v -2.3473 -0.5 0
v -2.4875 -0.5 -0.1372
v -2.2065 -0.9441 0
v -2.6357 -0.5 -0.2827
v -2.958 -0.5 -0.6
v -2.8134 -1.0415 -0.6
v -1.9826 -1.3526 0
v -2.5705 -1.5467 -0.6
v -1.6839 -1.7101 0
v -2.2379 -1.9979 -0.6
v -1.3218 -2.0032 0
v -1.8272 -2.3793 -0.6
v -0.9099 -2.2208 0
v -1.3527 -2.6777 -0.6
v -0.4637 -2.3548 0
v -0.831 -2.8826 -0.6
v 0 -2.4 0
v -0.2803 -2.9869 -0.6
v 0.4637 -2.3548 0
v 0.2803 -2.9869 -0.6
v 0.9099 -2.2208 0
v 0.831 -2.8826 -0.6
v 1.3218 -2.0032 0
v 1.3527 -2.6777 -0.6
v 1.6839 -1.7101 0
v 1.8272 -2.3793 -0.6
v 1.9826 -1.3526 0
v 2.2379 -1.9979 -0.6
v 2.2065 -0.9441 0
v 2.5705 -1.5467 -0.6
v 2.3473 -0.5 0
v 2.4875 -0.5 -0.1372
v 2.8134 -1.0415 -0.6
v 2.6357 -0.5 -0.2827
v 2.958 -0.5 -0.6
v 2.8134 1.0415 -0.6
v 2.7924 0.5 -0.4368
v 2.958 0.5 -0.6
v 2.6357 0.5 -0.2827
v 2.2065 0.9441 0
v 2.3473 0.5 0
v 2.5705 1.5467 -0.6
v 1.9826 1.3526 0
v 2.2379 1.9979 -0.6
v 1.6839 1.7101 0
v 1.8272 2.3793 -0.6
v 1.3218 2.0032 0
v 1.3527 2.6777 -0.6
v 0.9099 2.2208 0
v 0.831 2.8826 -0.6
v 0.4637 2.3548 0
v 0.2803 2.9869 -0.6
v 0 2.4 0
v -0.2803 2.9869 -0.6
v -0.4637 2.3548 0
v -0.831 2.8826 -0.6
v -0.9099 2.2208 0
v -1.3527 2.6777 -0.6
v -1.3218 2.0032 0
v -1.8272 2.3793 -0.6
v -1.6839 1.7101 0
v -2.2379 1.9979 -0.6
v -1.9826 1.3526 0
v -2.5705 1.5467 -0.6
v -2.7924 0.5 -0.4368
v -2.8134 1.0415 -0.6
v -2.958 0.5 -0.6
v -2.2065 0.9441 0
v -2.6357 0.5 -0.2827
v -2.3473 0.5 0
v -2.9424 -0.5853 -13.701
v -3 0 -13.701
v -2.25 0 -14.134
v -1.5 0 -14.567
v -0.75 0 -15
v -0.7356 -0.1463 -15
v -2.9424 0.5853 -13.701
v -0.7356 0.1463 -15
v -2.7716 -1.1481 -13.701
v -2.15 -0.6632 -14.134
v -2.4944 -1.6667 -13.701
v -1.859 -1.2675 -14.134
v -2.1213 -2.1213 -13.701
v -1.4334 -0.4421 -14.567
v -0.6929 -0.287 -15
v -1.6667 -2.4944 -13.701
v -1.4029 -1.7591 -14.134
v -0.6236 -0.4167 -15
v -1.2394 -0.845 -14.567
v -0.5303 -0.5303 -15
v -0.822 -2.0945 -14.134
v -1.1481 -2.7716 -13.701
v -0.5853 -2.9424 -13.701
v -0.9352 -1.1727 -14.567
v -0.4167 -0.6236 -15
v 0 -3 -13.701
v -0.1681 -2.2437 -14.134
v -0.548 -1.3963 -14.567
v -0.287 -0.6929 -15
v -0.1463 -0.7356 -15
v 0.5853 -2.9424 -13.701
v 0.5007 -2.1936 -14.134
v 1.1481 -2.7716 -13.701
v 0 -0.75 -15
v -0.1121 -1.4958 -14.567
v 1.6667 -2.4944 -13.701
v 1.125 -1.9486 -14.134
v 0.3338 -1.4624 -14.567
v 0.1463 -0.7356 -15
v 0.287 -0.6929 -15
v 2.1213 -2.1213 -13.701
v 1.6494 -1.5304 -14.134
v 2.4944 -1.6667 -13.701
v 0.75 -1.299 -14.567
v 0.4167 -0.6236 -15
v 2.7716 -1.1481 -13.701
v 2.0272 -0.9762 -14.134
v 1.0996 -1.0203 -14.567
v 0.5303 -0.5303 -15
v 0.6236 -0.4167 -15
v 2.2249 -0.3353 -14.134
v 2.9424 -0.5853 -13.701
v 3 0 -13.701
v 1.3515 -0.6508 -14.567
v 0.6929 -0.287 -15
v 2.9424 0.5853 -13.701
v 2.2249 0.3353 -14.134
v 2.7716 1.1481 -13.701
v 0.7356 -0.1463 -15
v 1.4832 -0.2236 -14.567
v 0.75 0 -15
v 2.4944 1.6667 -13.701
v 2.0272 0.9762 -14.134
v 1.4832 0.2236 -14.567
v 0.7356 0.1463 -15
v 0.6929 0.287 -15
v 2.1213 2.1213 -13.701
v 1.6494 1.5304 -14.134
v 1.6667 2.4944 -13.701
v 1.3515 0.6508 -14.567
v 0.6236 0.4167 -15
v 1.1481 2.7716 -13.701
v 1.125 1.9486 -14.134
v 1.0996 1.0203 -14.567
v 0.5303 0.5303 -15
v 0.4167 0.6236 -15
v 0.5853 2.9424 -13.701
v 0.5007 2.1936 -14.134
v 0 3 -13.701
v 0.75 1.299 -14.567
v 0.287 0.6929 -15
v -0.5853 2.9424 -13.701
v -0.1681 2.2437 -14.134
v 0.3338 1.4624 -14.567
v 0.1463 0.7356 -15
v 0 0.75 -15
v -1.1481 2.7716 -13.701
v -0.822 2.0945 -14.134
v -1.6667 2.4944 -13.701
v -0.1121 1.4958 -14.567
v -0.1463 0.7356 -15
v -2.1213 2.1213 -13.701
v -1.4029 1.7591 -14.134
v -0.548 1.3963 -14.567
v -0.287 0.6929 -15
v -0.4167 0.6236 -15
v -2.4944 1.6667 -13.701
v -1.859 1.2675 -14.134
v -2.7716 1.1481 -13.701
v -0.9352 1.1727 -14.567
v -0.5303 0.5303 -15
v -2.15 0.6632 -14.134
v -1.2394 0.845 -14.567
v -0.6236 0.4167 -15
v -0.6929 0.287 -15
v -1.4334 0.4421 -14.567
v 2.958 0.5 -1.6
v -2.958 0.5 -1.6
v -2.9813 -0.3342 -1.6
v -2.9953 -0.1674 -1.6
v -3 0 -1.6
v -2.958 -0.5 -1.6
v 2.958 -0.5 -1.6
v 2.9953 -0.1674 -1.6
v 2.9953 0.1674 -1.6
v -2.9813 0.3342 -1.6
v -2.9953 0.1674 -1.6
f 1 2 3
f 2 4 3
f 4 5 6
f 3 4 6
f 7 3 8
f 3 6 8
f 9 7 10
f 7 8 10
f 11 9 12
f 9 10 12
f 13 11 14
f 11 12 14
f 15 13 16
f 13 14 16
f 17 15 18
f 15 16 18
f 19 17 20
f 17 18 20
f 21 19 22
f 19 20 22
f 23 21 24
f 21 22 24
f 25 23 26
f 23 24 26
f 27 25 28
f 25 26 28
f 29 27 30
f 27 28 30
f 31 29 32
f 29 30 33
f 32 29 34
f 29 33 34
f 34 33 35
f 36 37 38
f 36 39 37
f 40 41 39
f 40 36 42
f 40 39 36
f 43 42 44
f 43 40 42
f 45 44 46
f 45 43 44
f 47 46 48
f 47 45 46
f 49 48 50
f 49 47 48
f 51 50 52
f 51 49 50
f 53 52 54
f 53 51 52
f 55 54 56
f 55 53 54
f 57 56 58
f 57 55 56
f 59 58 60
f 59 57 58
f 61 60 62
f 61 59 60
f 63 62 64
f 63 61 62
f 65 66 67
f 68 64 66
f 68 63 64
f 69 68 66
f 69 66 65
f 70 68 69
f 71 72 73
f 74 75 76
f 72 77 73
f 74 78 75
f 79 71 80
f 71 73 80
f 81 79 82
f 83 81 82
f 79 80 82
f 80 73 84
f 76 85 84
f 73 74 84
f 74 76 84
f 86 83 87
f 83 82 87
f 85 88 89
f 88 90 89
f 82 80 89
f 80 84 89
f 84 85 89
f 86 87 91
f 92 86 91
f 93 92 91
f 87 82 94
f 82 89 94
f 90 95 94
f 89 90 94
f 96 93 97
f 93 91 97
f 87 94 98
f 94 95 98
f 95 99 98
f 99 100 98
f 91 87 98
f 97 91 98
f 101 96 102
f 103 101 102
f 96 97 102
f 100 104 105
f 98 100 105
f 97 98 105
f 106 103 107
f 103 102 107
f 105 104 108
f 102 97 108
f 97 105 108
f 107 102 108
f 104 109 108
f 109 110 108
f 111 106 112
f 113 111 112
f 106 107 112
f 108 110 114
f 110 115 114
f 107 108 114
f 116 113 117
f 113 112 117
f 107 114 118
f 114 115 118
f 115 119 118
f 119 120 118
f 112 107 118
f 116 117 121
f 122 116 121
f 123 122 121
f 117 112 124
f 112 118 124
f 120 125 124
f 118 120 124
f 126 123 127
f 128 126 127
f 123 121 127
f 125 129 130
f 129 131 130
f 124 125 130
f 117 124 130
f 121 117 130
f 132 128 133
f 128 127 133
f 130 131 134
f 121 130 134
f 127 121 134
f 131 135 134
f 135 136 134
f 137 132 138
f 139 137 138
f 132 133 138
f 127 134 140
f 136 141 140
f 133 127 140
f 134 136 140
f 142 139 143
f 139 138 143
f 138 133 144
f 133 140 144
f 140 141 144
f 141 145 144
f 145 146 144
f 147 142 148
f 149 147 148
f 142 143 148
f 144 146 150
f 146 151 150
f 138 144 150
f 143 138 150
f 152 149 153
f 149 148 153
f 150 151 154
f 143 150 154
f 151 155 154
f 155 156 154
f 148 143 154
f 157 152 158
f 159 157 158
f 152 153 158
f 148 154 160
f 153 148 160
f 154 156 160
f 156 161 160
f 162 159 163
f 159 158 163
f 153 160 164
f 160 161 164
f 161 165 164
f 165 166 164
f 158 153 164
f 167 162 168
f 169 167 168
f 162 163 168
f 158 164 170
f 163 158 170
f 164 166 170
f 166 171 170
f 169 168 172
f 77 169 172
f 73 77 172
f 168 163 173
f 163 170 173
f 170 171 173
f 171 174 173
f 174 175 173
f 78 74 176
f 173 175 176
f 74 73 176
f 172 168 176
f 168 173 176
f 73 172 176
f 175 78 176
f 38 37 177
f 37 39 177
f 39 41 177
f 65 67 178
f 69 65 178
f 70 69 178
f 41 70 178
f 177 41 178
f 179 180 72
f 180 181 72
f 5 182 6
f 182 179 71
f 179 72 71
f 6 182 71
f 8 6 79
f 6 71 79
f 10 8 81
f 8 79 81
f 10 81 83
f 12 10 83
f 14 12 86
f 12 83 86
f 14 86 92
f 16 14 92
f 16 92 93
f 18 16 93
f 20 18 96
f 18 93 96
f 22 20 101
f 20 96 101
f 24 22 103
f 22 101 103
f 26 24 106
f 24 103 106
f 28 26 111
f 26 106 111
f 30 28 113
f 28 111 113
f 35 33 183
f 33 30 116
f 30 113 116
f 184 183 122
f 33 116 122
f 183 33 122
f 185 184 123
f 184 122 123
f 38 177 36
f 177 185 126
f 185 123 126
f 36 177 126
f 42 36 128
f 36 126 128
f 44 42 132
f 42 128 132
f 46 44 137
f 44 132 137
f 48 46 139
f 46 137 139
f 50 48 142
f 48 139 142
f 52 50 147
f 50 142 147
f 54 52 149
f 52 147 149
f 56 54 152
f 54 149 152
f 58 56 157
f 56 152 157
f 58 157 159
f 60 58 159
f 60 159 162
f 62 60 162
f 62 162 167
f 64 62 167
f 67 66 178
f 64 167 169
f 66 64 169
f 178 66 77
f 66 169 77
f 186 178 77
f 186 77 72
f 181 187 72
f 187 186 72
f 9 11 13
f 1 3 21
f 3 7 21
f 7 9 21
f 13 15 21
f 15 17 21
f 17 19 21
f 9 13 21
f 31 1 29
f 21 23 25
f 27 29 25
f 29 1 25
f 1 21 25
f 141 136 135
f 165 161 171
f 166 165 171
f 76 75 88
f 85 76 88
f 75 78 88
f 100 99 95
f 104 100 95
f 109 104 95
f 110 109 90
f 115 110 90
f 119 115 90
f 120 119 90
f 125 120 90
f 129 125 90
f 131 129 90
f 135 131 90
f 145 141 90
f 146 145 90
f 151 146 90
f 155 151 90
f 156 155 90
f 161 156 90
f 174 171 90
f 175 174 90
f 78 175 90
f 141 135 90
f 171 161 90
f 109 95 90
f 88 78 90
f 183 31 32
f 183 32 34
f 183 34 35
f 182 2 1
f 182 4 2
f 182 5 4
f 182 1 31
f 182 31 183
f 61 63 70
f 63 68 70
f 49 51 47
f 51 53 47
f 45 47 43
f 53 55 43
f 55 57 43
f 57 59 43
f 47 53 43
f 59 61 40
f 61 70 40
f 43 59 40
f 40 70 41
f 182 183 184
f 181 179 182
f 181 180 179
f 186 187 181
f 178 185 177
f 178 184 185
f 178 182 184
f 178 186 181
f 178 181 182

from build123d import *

# Parameters (mm, degrees)
CUT_EXTRUDE_1_DEPTH      = 16.588457268
CUT_EXTRUDE_1_DEPTH_BACK = 16.588457268
SKETCH_2_W               = 1.6
SKETCH_2_H               = 1
CHAMFER_1_SIZE           = 0.6


with BuildPart() as part:
    # Эскиз1 → Повернуть1 (revolve)
    with BuildSketch(Plane(origin=(0, 0, 0), x_dir=(1, 0, 0), z_dir=(0, 1, 0))):
        Polygon((0, 0), (-3, 0), (-3, 13.700961894), (-0.75, 15), (0, 15), align=None)
    revolve(axis=Axis((0, 0, -15), (0, 0, 1)))

    # Эскиз2 → Вырез-Вытянуть1 (cut, two sides: drawn at the far end of the back side and taken through both)
    with BuildSketch(Plane(origin=(0, 0, 0), x_dir=(0, 0, -1), z_dir=(1, 0, 0)).offset(-CUT_EXTRUDE_1_DEPTH_BACK)):
        with Locations((0.8, 0)):
            Rectangle(SKETCH_2_W, SKETCH_2_H)
    extrude(amount=CUT_EXTRUDE_1_DEPTH + CUT_EXTRUDE_1_DEPTH_BACK, mode=Mode.SUBTRACT)

    # Фаска1
    chamfer_1_edges = [part.edges().sort_by_distance(p)[0] for p in [
        (0, 3, 0),
        (0, -3, 0),
    ]]
    chamfer(chamfer_1_edges, length=CHAMFER_1_SIZE)


solid = part.part
